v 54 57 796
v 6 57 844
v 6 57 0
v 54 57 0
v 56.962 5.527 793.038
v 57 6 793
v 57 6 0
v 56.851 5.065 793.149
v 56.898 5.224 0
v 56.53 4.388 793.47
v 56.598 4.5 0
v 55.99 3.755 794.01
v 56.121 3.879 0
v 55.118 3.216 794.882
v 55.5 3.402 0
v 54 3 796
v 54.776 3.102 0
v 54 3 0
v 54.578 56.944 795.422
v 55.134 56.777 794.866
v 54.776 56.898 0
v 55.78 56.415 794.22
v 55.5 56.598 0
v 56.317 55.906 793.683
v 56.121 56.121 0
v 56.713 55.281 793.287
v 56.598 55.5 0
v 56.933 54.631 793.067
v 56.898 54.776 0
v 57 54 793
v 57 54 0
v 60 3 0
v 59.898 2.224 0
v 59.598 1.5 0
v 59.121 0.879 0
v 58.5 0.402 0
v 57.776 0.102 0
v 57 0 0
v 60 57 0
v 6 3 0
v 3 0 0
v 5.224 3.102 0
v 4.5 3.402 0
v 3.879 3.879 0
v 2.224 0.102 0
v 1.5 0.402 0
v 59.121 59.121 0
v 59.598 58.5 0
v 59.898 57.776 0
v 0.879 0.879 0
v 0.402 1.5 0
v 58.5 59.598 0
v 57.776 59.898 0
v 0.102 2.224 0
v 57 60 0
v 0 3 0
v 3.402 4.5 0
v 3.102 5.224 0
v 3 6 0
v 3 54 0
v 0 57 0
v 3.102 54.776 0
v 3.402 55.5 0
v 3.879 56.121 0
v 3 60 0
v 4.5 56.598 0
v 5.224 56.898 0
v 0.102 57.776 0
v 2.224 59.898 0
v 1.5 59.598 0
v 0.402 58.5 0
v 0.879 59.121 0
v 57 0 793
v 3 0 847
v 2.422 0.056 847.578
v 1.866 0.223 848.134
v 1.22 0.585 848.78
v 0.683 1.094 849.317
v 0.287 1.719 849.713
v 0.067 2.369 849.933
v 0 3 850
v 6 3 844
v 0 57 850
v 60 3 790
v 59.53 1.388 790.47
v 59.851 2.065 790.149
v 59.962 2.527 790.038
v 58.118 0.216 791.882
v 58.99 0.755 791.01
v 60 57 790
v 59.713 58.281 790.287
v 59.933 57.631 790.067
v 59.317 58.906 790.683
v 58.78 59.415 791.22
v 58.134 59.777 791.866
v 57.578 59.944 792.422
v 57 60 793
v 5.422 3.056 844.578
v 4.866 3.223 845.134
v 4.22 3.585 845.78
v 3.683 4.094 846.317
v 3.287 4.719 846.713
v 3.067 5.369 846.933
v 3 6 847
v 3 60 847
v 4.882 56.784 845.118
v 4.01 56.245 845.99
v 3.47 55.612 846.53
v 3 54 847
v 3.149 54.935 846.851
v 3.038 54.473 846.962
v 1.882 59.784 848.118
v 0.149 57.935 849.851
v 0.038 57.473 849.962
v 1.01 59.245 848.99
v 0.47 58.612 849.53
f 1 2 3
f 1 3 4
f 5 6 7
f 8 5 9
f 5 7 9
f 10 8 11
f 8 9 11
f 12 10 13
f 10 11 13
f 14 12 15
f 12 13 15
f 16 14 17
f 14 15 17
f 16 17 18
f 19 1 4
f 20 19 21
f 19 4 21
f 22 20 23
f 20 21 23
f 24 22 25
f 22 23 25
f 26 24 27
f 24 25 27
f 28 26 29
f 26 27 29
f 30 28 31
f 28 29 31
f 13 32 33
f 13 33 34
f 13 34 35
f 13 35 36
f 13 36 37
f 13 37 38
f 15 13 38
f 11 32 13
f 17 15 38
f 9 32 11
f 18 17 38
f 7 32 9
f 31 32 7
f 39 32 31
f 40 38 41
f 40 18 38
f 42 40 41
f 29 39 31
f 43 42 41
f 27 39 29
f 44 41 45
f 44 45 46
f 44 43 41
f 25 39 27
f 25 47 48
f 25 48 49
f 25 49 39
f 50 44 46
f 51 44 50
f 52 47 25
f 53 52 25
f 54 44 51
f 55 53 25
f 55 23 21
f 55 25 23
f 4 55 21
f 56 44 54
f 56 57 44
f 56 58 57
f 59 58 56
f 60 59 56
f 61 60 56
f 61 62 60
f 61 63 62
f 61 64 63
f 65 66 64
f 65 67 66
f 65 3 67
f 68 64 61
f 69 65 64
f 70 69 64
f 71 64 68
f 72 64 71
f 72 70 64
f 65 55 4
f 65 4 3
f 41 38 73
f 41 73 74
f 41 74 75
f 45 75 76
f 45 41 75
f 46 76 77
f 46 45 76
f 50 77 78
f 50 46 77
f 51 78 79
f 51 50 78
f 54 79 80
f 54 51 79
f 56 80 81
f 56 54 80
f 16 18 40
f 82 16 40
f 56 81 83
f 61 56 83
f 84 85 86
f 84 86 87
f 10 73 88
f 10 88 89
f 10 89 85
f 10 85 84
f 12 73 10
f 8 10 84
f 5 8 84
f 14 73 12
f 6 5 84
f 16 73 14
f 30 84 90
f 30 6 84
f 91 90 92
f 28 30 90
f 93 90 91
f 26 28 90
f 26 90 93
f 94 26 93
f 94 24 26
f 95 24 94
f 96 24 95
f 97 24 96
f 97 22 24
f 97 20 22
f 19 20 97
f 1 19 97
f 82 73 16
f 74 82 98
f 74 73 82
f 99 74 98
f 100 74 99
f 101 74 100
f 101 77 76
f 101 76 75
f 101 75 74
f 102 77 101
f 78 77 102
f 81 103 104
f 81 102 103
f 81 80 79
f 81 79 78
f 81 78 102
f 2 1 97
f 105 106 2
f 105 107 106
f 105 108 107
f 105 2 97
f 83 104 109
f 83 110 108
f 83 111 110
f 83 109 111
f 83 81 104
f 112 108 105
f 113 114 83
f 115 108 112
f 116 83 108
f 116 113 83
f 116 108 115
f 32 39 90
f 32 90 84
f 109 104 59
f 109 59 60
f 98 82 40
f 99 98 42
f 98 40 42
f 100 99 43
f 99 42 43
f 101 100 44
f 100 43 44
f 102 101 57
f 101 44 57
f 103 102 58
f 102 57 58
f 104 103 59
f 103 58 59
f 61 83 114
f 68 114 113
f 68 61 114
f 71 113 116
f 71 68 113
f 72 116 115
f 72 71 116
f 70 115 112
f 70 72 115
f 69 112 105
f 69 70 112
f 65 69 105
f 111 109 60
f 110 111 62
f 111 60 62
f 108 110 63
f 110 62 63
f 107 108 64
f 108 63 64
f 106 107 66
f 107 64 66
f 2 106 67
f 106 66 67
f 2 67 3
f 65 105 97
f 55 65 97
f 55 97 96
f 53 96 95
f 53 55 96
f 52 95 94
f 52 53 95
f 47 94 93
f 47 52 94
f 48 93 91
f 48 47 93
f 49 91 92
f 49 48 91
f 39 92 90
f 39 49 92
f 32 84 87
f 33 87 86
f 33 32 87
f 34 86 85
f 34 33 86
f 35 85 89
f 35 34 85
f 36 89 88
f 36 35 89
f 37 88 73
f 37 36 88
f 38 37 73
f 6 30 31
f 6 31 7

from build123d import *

# Parameters (mm, degrees)
DODANIE_WYCI_GNI_CIE1_DEPTH = 850
SZKIC3_W                    = 183.44852115
SZKIC3_H                    = 118.68309716
WYTNIJ_WYCI_GNI_CIE1_DEPTH  = 605.02814504


with BuildPart() as part:
    # Szkic2 → Dodanie-wyciągnięcie1 (new body)
    with BuildSketch(Plane.XY):
        with BuildLine():
            ThreePointArc((0, 57), (0.878679656, 59.121320344), (3, 60))
            Line((3, 60), (57, 60))
            ThreePointArc((57, 60), (59.121320344, 59.121320344), (60, 57))
            Line((60, 57), (60, 3))
            ThreePointArc((60, 3), (59.121320344, 0.878679656), (57, 0))
            Line((57, 0), (3, 0))
            ThreePointArc((3, 0), (0.878679656, 0.878679656), (0, 3))
            Line((0, 3), (0, 57))
        make_face()
        with BuildLine():
            Line((3, 6), (3, 54))
            ThreePointArc((3, 54), (3.878679656, 56.121320344), (6, 57))
            Line((6, 57), (54, 57))
            ThreePointArc((54, 57), (56.121320344, 56.121320344), (57, 54))
            Line((57, 54), (57, 6))
            ThreePointArc((57, 6), (56.121320344, 3.878679656), (54, 3))
            Line((54, 3), (6, 3))
            ThreePointArc((6, 3), (3.878679656, 3.878679656), (3, 6))
        make_face(mode=Mode.SUBTRACT)
    extrude(amount=DODANIE_WYCI_GNI_CIE1_DEPTH)

    # Szkic3 → Wytnij-wyciągnięcie1 (cut, through all)
    with BuildSketch(Plane(origin=(425, 0, 425), x_dir=(0, 1, 0), z_dir=(0.7071067811865488, 0, 0.7071067811865464))):
        with Locations((36.943590896, 573.417053453)):
            Rectangle(SZKIC3_W, SZKIC3_H)
    extrude(amount=WYTNIJ_WYCI_GNI_CIE1_DEPTH, mode=Mode.SUBTRACT)


solid = part.part
